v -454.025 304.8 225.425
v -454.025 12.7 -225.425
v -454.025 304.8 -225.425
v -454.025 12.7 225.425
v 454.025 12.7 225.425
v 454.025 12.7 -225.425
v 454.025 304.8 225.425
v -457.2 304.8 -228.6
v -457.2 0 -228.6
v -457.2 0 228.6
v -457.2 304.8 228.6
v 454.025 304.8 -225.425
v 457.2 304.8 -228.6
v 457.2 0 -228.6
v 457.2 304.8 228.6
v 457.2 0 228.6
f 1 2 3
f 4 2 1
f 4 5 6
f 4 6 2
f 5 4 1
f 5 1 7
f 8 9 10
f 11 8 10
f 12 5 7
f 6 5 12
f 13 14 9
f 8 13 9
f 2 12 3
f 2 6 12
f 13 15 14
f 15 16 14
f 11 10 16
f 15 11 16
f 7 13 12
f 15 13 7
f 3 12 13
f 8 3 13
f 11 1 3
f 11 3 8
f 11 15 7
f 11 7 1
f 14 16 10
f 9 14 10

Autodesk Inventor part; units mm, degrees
ref_plane "YZ Plane" through (0, 0, 0) normal (1, 0, 0) x (0, 1, 0)
ref_plane "XZ Plane" through (0, 0, 0) normal (0, 1, 0) x (-1, 0, 0)
ref_plane "XY Plane" through (0, 0, 0) normal (0, 0, 1) x (1, 0, 0)
sketch "Sketch2" plane through (0, 0, 0) normal (0, 1, 0) x (-1, 0, 0)
  line L0 (457.2, 228.6) -> (-457.2, 228.6)
  line L1 (-457.2, 228.6) -> (-457.2, -228.6)
  line L2 (-457.2, -228.6) -> (457.2, -228.6)
  line L3 (457.2, -228.6) -> (457.2, 228.6)
  line L4 (457.2, 228.6) -> (-457.2, -228.6) construction
  line L5 (-457.2, 228.6) -> (457.2, -228.6) construction
  line L6 (454.025, 225.425) -> (-454.025, 225.425)
  line L7 (-454.025, 225.425) -> (-454.025, -225.425)
  line L8 (-454.025, -225.425) -> (454.025, -225.425)
  line L9 (454.025, -225.425) -> (454.025, 225.425)
  line L10 (454.025, 225.425) -> (-454.025, -225.425) construction
  line L11 (-454.025, 225.425) -> (454.025, -225.425) construction
  point P0 (0, 0)
  dimension "d0" = 914.4
  dimension "d1" = 457.2
  dimension "d2" = 3.175
  dimension "d3" = 3.175
extrude "Extrusion1" add sketch "Sketch2" along normal blind 304.8
extrude "Extrusion2" add sketch "Sketch2" along normal blind 12.7 contours L3 L2 L1 L0 | L9 L8 L7 L6
properties part number "Tank" material "Glass"
